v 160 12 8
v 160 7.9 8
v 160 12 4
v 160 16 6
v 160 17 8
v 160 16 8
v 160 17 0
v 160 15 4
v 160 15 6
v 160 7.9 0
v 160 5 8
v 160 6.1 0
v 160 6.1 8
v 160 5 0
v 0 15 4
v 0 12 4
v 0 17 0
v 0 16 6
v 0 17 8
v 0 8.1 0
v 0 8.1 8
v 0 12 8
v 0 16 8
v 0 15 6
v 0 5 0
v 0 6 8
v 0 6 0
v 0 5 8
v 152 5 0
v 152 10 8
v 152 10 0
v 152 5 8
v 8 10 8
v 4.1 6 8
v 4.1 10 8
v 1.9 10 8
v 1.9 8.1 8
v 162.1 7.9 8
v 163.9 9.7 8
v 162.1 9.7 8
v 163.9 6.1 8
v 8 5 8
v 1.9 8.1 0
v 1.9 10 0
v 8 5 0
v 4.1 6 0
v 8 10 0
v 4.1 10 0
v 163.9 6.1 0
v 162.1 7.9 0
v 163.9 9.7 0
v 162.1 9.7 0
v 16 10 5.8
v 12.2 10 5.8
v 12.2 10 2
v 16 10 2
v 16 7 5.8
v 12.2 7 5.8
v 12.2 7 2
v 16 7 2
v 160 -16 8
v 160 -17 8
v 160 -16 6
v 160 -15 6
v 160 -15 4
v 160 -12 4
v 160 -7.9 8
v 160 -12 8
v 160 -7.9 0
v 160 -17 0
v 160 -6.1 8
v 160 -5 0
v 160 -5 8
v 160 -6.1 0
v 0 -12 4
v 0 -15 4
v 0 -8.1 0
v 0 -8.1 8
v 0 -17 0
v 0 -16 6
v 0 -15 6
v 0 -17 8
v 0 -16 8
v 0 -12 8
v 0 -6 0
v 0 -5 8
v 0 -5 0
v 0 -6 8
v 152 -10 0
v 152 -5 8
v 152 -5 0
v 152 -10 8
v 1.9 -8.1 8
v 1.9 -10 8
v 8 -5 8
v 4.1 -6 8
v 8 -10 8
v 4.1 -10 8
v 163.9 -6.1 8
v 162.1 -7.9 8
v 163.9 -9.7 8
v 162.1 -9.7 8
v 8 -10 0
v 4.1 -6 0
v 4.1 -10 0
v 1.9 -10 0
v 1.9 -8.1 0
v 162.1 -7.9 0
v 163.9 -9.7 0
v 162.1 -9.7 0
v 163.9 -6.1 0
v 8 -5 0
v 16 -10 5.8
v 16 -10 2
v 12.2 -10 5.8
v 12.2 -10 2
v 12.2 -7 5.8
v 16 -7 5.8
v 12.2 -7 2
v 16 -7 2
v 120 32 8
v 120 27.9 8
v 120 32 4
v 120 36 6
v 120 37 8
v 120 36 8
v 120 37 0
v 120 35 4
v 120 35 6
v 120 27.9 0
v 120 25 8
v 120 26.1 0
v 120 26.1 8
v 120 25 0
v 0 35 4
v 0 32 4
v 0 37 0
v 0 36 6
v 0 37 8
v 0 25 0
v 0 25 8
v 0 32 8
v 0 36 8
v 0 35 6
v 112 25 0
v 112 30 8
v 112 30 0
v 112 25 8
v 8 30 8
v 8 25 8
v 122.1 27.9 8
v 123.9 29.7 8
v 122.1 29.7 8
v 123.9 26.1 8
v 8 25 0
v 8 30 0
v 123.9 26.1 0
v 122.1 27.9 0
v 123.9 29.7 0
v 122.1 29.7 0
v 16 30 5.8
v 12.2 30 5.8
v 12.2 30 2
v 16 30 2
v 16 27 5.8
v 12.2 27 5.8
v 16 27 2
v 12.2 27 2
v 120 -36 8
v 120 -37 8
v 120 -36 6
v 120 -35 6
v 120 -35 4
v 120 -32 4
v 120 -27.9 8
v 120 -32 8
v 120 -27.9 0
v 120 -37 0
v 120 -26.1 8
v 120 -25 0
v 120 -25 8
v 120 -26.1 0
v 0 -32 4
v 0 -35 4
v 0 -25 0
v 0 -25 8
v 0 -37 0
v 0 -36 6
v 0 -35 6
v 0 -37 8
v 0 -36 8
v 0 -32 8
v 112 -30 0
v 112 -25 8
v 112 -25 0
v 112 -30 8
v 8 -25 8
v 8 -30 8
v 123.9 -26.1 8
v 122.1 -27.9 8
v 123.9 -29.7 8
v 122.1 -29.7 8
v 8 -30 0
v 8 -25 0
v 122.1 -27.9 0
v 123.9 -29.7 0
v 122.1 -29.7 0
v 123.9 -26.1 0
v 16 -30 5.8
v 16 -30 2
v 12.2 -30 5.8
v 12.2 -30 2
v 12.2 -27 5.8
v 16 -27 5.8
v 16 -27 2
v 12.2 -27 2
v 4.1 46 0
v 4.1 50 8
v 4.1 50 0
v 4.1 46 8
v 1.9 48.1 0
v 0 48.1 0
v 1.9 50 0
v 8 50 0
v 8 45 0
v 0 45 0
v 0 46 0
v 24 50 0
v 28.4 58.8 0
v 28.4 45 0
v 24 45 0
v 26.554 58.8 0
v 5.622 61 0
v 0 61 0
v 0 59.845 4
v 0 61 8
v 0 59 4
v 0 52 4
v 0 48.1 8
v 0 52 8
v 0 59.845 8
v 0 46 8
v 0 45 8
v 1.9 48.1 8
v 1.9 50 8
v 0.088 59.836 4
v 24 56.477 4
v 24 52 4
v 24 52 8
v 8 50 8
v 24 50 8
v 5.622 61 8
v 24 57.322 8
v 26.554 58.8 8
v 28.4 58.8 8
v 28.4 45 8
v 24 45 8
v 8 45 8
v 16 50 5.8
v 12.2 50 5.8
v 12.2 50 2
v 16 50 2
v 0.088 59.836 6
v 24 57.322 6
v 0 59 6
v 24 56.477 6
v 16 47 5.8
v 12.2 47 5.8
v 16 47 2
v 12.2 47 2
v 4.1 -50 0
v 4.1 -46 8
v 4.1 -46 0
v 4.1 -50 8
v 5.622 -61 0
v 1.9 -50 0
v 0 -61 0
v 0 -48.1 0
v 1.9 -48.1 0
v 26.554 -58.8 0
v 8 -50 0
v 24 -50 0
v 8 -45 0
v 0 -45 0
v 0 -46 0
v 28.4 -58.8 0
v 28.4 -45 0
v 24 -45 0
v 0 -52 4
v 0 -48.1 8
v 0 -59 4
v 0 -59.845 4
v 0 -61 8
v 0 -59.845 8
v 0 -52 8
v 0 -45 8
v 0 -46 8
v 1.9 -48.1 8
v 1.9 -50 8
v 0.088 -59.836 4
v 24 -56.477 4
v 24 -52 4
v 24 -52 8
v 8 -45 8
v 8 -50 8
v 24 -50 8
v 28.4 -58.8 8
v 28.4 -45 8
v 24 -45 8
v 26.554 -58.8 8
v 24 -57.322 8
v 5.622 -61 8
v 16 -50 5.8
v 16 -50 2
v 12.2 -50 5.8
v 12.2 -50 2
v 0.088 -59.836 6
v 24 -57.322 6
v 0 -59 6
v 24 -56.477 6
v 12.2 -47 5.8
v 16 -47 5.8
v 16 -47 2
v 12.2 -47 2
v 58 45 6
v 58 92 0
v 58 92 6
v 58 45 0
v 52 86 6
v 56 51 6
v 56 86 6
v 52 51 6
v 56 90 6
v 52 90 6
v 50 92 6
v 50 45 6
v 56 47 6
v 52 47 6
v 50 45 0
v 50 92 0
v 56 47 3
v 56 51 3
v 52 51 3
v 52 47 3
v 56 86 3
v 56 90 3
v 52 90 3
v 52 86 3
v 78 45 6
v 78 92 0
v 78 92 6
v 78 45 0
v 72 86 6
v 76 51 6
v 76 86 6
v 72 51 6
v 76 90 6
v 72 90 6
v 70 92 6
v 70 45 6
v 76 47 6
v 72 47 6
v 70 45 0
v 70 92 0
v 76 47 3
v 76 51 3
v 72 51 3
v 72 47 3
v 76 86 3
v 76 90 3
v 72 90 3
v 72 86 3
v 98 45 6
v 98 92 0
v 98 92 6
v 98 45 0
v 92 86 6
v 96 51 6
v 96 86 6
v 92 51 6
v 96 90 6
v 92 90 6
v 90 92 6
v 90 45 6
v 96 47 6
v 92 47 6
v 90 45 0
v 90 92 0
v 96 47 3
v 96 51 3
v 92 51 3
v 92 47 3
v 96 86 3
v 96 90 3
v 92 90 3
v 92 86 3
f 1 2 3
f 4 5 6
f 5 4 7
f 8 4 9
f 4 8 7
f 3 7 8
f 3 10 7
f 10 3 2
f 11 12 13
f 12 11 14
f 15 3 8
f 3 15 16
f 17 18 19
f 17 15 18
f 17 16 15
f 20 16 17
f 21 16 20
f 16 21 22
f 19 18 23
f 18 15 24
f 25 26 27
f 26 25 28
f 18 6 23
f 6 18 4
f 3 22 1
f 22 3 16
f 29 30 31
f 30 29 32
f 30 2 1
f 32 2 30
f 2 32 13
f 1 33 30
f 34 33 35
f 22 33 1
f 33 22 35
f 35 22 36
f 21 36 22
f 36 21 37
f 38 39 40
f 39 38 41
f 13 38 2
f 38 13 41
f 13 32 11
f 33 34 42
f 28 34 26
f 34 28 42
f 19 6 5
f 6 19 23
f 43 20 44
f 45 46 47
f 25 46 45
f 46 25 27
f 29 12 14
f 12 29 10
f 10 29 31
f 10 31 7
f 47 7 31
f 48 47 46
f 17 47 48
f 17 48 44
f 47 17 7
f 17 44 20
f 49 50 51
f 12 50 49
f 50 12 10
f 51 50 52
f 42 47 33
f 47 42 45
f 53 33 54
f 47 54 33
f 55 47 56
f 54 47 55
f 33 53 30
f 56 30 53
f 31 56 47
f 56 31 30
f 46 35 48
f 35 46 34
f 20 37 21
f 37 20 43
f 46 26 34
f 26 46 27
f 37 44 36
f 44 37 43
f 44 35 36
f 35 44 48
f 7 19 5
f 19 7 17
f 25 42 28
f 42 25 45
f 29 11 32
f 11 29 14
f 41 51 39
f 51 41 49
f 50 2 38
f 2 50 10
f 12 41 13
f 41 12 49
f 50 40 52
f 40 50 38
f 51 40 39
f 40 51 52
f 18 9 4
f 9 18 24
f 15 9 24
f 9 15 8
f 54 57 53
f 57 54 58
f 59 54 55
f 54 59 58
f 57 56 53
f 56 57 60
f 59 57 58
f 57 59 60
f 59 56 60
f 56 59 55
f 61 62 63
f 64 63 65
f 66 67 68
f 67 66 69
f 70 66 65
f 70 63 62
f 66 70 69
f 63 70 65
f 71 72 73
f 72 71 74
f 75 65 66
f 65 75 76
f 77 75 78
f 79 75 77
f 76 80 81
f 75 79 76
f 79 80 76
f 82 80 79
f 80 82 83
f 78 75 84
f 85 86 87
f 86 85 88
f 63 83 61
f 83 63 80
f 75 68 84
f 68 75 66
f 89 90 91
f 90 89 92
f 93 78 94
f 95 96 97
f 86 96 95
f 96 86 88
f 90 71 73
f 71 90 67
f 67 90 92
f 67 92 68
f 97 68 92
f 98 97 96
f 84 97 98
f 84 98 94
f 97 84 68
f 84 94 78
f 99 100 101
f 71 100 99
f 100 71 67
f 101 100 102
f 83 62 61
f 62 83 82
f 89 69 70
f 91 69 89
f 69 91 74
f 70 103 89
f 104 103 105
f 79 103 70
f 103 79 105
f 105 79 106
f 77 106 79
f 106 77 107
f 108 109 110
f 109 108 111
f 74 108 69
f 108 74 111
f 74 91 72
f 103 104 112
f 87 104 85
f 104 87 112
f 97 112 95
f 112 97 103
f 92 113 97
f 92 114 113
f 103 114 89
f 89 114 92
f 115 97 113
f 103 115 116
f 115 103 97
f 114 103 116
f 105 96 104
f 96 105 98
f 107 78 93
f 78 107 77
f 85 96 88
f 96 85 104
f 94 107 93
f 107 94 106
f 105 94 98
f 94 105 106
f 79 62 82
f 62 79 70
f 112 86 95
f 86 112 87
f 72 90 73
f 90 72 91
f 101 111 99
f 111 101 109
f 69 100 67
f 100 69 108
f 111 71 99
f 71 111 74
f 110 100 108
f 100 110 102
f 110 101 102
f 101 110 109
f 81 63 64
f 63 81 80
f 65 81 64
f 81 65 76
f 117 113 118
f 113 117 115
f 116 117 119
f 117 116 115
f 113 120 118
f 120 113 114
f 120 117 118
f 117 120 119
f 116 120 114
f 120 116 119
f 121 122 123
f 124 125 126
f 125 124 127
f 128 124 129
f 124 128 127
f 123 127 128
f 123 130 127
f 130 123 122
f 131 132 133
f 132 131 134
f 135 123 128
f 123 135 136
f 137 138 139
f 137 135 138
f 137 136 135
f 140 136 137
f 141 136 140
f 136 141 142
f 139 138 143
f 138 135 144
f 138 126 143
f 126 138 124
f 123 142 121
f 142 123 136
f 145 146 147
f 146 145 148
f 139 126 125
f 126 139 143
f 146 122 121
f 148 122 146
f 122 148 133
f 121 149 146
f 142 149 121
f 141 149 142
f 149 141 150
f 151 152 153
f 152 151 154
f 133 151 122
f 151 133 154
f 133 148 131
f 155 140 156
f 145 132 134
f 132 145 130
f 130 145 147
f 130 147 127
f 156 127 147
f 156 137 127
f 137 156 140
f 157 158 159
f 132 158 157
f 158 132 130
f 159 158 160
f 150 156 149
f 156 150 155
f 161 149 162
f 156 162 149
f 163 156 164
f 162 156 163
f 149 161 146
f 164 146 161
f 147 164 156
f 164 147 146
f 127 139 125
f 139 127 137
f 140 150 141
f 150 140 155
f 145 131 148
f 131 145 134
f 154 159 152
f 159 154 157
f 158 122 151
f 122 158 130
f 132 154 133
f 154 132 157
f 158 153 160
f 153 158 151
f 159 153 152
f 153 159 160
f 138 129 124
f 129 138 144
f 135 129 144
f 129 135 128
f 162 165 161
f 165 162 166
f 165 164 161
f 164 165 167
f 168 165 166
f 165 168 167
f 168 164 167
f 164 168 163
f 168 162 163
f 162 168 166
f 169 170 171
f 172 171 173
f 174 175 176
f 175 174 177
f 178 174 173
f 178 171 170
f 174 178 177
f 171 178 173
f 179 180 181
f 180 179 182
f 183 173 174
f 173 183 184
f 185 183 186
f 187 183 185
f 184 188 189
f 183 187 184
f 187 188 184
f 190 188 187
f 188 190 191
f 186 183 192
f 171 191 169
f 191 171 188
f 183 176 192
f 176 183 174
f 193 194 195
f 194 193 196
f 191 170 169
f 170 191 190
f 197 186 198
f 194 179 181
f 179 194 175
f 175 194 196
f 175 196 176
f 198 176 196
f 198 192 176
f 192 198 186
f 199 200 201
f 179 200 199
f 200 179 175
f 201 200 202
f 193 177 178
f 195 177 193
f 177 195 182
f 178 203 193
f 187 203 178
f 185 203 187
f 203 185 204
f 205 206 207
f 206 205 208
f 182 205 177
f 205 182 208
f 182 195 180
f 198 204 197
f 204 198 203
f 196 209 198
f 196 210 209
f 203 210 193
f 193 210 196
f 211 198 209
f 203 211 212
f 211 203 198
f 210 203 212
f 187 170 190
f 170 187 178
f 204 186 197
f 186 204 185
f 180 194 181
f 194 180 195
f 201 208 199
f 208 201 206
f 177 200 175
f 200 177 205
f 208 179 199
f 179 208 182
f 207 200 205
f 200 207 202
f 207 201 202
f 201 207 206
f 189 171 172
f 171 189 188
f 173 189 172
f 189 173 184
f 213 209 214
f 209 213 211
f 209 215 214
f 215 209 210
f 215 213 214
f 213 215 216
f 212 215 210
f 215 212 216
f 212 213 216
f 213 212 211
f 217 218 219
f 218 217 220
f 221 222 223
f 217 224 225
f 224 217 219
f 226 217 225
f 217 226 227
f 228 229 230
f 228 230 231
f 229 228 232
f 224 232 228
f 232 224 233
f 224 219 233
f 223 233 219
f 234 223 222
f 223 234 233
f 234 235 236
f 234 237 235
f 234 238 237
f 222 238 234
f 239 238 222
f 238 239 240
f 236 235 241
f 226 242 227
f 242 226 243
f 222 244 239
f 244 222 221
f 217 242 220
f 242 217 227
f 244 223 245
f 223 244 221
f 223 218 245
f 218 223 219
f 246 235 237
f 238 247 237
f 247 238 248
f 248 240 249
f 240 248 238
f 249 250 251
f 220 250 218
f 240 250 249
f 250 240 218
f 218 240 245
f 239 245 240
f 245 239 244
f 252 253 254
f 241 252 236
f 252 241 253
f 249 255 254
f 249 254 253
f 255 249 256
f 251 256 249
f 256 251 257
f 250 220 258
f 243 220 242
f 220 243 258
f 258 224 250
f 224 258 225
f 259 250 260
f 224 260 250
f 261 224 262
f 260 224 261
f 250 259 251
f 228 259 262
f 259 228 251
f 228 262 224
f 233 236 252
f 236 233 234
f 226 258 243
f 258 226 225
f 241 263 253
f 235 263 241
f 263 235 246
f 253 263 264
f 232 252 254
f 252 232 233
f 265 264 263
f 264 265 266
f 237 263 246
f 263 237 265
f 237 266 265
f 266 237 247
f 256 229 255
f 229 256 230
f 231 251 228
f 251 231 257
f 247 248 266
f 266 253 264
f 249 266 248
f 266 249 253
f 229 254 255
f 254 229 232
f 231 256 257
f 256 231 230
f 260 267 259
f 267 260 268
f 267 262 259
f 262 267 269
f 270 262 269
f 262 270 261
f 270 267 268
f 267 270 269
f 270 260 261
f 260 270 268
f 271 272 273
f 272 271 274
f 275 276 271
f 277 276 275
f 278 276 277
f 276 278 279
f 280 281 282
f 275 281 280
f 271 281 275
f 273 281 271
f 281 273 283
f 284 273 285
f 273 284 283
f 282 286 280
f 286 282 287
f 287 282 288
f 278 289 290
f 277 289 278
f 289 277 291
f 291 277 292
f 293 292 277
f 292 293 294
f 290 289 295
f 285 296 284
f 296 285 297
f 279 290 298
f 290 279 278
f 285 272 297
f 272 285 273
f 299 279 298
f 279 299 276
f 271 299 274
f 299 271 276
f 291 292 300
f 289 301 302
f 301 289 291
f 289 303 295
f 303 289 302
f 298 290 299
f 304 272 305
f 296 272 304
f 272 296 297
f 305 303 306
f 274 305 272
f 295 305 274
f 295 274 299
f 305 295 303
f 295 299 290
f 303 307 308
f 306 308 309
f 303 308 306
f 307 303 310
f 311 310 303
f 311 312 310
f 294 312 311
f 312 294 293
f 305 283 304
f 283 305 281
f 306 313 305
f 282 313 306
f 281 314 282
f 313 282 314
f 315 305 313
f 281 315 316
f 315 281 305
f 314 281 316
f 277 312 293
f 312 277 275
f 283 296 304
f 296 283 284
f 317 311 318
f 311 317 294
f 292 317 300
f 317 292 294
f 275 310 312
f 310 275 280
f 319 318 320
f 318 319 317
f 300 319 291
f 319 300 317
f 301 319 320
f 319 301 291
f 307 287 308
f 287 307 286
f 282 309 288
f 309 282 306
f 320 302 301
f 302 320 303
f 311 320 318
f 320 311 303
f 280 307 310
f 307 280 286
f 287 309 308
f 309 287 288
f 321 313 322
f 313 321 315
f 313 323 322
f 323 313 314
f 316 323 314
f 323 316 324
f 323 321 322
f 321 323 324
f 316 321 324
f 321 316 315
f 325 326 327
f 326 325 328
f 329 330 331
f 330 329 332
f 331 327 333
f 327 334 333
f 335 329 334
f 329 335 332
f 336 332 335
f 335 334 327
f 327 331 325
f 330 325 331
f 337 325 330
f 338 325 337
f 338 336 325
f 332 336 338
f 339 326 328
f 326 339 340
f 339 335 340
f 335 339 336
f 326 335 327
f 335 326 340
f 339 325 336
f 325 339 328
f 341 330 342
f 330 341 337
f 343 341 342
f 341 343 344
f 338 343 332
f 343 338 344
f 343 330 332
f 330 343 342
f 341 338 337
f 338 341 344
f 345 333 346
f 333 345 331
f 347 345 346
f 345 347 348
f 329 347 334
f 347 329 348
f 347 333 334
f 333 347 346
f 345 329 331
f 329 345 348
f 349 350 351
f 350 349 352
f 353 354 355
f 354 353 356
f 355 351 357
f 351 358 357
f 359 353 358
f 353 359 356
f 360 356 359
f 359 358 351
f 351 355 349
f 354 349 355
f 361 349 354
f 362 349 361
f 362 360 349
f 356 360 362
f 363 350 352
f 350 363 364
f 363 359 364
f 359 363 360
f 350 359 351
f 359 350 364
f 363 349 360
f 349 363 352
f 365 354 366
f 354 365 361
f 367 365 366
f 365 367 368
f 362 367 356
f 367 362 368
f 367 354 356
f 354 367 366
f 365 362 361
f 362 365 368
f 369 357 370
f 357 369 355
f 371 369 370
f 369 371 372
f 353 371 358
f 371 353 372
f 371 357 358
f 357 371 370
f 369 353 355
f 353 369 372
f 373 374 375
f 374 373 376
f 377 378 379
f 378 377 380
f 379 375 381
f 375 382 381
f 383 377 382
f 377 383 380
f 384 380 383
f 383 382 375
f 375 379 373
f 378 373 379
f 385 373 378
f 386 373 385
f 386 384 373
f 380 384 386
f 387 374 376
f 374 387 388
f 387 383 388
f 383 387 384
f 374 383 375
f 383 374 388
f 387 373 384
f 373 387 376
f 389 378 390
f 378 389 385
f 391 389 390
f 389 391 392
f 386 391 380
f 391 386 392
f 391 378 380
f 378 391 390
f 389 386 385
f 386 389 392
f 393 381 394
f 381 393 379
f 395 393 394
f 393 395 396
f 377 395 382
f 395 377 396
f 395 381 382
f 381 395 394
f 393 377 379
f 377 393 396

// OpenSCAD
/*
//                  N E S P R E S S O
//                  C U P H O L D E R
//
//  - joints are 'odd' floating points to make good fits
//  - set $bridge to false to elimnate bridge joints + parts
//
// @author : liquidrinu
*/

cube([0,0,0]); // dummyload

//////////////
// [constants]

$beam_length = 40;
$beam_width = 12;
$beam_depth = 8;

$slider_hole_width = 4;
$slider_hole_height = 8;

$bridge = true;
$bridge_width = 47;
$bridge_joint_length = 6;

//////////////
// [render]

module render () {

  // * comment out single lines if u want single piece extractions

  // left beams - order: [top,middle,dispenser]
  mirror([0,10,0]) translate([0,5,0]) beam(4,true,true);
  mirror([0,20,0]) translate([0,25,0]) beam(3,true,false);
  mirror([0,10,0]) translate([0,45,0]) dispenser();

  // right beams - order: [top,middle,dispenser]
  translate([0,25,0]) beam(3,true,false);
  translate([0,5,0]) beam(4,true,true);
  translate([0,45,0]) dispenser();

  // bridge pieces
  if($bridge) {
    translate([50,45,0]) bridge();
    translate([70,45,0]) bridge();
    translate([90,45,0]) bridge();
  }
} render();


//////////////
// [modules]
module beam ($units, $joints_m, $joints_f) {

  // beam full
  difference(){

    // body
    cube([
      $beam_length * $units,
      $beam_width,
      $beam_depth
    ]);

    // slider hole
    translate([0,7,4]){

      cube([
        $beam_length * $units,
        $slider_hole_width,
        $slider_hole_height
      ]);

      // cutout side
      translate([8,-8,-4]){
        color("blue")
        cube([
          $beam_length * $units -16,
          $beam_width -6,
          $beam_depth
        ]);
      }
    }

  //joints female
    if($joints_f){
      translate([0,1,0]){
        color("red") cube([4.1,2.1,10]);
        translate([1.9,2,0]){
          color("red") cube([2.2,2,10]);
        }
      }
    }
  }

  // sliderhole inner ridge
  translate([0, 10,0]){
    cube([
      $beam_length * $units,
      1,
      6
    ]);
  }

  // joints male
  if($joints_m){
    translate([
      $beam_length * $units,
      1.1,
      0
    ]){
      color("red") cube([3.9,1.8,8]);
      translate([2.1,1.8,0]){
        color("green") cube([1.8,1.8,8]);
      }
    }
  }

  // bridge joints
  if($bridge == true) {
    rotate([0,0,180]){
      translate([-16,-5,$beam_depth / 2 -2 ]){
        color("purple")
        cube([
          3.8,
          $bridge_joint_length / 2,
          3.8
        ]);
      }
    }
  }
}

module dispenser () {

  $beam_length = 30;

  // sliderhole add-on
  difference(){
    translate([0,14,0]){
      rotate([0,0,-6]) {
        cube([$beam_length -4,2,6]);
      }
    }
  }

  // beam full
  difference(){

  // body
  cube([
    $beam_length,
    16,
    $beam_depth
  ]);

  // slider hole
  translate([-2,5,0]){
    rotate([0,0,-6]) {
      translate([0,7,4]){
        cube([$beam_length ,3,6]);
      }
    }
  }

  translate([0,7,4]){

    cube([
      $beam_length + 8,
      5,
      6
    ]);

    // ugly fill hole
    translate([-30,0,0]){
      cube([$beam_length + 6,5,6]);
    }

    // cutout side
    translate([8,-8,-4]){
      color("blue")
      cube([
        $beam_length - 8,
        6,
        $beam_depth
      ]);
    }
  }

  //joints female
  translate([0,1,0]){
    color("red") cube([4.1,2.1,10]);
      translate([1.9,2,0]){
        color("red") cube([2.2,2,10]);
      }
  }

  // ugly fill hole
  rotate([0,0,-6]) {
    translate([-8,10,4]){
      cube([120,4,8]);
    }
  }

  //  angled outline beam
  rotate([0,0,-6]) {
    translate([0,16.5,0]){
      cube([$beam_length ,20,12]);
    }
  }

  // bottom body chop chop
    translate([28,-10,0]){
      cube([10,26,$beam_depth]);
    }
  }


  // ugly fill bottom beam
  translate([24,0,0]){
    cube([4.4,13.8,$beam_depth]);
  }

  // bridge joints
  if($bridge == true) {
    rotate([0,0,180]){
      translate([-16,-5,$beam_depth / 2 -2 ]){
        color("purple")
        cube([
          3.8,
          $bridge_joint_length / 2,
          3.8
        ]);
      }
    }
  }
}

module bridge () {

  difference() {
    cube([8, $bridge_width ,$bridge_joint_length]);

    // joints (cutout)
    translate([2,2,$bridge_joint_length / 2]){
      cube([4,4, $bridge_joint_length / 2]);
    }
    translate([2,$bridge_width - 6,$bridge_joint_length / 2]){
      cube([4,4, $bridge_joint_length / 2]);
    }
  }
}
